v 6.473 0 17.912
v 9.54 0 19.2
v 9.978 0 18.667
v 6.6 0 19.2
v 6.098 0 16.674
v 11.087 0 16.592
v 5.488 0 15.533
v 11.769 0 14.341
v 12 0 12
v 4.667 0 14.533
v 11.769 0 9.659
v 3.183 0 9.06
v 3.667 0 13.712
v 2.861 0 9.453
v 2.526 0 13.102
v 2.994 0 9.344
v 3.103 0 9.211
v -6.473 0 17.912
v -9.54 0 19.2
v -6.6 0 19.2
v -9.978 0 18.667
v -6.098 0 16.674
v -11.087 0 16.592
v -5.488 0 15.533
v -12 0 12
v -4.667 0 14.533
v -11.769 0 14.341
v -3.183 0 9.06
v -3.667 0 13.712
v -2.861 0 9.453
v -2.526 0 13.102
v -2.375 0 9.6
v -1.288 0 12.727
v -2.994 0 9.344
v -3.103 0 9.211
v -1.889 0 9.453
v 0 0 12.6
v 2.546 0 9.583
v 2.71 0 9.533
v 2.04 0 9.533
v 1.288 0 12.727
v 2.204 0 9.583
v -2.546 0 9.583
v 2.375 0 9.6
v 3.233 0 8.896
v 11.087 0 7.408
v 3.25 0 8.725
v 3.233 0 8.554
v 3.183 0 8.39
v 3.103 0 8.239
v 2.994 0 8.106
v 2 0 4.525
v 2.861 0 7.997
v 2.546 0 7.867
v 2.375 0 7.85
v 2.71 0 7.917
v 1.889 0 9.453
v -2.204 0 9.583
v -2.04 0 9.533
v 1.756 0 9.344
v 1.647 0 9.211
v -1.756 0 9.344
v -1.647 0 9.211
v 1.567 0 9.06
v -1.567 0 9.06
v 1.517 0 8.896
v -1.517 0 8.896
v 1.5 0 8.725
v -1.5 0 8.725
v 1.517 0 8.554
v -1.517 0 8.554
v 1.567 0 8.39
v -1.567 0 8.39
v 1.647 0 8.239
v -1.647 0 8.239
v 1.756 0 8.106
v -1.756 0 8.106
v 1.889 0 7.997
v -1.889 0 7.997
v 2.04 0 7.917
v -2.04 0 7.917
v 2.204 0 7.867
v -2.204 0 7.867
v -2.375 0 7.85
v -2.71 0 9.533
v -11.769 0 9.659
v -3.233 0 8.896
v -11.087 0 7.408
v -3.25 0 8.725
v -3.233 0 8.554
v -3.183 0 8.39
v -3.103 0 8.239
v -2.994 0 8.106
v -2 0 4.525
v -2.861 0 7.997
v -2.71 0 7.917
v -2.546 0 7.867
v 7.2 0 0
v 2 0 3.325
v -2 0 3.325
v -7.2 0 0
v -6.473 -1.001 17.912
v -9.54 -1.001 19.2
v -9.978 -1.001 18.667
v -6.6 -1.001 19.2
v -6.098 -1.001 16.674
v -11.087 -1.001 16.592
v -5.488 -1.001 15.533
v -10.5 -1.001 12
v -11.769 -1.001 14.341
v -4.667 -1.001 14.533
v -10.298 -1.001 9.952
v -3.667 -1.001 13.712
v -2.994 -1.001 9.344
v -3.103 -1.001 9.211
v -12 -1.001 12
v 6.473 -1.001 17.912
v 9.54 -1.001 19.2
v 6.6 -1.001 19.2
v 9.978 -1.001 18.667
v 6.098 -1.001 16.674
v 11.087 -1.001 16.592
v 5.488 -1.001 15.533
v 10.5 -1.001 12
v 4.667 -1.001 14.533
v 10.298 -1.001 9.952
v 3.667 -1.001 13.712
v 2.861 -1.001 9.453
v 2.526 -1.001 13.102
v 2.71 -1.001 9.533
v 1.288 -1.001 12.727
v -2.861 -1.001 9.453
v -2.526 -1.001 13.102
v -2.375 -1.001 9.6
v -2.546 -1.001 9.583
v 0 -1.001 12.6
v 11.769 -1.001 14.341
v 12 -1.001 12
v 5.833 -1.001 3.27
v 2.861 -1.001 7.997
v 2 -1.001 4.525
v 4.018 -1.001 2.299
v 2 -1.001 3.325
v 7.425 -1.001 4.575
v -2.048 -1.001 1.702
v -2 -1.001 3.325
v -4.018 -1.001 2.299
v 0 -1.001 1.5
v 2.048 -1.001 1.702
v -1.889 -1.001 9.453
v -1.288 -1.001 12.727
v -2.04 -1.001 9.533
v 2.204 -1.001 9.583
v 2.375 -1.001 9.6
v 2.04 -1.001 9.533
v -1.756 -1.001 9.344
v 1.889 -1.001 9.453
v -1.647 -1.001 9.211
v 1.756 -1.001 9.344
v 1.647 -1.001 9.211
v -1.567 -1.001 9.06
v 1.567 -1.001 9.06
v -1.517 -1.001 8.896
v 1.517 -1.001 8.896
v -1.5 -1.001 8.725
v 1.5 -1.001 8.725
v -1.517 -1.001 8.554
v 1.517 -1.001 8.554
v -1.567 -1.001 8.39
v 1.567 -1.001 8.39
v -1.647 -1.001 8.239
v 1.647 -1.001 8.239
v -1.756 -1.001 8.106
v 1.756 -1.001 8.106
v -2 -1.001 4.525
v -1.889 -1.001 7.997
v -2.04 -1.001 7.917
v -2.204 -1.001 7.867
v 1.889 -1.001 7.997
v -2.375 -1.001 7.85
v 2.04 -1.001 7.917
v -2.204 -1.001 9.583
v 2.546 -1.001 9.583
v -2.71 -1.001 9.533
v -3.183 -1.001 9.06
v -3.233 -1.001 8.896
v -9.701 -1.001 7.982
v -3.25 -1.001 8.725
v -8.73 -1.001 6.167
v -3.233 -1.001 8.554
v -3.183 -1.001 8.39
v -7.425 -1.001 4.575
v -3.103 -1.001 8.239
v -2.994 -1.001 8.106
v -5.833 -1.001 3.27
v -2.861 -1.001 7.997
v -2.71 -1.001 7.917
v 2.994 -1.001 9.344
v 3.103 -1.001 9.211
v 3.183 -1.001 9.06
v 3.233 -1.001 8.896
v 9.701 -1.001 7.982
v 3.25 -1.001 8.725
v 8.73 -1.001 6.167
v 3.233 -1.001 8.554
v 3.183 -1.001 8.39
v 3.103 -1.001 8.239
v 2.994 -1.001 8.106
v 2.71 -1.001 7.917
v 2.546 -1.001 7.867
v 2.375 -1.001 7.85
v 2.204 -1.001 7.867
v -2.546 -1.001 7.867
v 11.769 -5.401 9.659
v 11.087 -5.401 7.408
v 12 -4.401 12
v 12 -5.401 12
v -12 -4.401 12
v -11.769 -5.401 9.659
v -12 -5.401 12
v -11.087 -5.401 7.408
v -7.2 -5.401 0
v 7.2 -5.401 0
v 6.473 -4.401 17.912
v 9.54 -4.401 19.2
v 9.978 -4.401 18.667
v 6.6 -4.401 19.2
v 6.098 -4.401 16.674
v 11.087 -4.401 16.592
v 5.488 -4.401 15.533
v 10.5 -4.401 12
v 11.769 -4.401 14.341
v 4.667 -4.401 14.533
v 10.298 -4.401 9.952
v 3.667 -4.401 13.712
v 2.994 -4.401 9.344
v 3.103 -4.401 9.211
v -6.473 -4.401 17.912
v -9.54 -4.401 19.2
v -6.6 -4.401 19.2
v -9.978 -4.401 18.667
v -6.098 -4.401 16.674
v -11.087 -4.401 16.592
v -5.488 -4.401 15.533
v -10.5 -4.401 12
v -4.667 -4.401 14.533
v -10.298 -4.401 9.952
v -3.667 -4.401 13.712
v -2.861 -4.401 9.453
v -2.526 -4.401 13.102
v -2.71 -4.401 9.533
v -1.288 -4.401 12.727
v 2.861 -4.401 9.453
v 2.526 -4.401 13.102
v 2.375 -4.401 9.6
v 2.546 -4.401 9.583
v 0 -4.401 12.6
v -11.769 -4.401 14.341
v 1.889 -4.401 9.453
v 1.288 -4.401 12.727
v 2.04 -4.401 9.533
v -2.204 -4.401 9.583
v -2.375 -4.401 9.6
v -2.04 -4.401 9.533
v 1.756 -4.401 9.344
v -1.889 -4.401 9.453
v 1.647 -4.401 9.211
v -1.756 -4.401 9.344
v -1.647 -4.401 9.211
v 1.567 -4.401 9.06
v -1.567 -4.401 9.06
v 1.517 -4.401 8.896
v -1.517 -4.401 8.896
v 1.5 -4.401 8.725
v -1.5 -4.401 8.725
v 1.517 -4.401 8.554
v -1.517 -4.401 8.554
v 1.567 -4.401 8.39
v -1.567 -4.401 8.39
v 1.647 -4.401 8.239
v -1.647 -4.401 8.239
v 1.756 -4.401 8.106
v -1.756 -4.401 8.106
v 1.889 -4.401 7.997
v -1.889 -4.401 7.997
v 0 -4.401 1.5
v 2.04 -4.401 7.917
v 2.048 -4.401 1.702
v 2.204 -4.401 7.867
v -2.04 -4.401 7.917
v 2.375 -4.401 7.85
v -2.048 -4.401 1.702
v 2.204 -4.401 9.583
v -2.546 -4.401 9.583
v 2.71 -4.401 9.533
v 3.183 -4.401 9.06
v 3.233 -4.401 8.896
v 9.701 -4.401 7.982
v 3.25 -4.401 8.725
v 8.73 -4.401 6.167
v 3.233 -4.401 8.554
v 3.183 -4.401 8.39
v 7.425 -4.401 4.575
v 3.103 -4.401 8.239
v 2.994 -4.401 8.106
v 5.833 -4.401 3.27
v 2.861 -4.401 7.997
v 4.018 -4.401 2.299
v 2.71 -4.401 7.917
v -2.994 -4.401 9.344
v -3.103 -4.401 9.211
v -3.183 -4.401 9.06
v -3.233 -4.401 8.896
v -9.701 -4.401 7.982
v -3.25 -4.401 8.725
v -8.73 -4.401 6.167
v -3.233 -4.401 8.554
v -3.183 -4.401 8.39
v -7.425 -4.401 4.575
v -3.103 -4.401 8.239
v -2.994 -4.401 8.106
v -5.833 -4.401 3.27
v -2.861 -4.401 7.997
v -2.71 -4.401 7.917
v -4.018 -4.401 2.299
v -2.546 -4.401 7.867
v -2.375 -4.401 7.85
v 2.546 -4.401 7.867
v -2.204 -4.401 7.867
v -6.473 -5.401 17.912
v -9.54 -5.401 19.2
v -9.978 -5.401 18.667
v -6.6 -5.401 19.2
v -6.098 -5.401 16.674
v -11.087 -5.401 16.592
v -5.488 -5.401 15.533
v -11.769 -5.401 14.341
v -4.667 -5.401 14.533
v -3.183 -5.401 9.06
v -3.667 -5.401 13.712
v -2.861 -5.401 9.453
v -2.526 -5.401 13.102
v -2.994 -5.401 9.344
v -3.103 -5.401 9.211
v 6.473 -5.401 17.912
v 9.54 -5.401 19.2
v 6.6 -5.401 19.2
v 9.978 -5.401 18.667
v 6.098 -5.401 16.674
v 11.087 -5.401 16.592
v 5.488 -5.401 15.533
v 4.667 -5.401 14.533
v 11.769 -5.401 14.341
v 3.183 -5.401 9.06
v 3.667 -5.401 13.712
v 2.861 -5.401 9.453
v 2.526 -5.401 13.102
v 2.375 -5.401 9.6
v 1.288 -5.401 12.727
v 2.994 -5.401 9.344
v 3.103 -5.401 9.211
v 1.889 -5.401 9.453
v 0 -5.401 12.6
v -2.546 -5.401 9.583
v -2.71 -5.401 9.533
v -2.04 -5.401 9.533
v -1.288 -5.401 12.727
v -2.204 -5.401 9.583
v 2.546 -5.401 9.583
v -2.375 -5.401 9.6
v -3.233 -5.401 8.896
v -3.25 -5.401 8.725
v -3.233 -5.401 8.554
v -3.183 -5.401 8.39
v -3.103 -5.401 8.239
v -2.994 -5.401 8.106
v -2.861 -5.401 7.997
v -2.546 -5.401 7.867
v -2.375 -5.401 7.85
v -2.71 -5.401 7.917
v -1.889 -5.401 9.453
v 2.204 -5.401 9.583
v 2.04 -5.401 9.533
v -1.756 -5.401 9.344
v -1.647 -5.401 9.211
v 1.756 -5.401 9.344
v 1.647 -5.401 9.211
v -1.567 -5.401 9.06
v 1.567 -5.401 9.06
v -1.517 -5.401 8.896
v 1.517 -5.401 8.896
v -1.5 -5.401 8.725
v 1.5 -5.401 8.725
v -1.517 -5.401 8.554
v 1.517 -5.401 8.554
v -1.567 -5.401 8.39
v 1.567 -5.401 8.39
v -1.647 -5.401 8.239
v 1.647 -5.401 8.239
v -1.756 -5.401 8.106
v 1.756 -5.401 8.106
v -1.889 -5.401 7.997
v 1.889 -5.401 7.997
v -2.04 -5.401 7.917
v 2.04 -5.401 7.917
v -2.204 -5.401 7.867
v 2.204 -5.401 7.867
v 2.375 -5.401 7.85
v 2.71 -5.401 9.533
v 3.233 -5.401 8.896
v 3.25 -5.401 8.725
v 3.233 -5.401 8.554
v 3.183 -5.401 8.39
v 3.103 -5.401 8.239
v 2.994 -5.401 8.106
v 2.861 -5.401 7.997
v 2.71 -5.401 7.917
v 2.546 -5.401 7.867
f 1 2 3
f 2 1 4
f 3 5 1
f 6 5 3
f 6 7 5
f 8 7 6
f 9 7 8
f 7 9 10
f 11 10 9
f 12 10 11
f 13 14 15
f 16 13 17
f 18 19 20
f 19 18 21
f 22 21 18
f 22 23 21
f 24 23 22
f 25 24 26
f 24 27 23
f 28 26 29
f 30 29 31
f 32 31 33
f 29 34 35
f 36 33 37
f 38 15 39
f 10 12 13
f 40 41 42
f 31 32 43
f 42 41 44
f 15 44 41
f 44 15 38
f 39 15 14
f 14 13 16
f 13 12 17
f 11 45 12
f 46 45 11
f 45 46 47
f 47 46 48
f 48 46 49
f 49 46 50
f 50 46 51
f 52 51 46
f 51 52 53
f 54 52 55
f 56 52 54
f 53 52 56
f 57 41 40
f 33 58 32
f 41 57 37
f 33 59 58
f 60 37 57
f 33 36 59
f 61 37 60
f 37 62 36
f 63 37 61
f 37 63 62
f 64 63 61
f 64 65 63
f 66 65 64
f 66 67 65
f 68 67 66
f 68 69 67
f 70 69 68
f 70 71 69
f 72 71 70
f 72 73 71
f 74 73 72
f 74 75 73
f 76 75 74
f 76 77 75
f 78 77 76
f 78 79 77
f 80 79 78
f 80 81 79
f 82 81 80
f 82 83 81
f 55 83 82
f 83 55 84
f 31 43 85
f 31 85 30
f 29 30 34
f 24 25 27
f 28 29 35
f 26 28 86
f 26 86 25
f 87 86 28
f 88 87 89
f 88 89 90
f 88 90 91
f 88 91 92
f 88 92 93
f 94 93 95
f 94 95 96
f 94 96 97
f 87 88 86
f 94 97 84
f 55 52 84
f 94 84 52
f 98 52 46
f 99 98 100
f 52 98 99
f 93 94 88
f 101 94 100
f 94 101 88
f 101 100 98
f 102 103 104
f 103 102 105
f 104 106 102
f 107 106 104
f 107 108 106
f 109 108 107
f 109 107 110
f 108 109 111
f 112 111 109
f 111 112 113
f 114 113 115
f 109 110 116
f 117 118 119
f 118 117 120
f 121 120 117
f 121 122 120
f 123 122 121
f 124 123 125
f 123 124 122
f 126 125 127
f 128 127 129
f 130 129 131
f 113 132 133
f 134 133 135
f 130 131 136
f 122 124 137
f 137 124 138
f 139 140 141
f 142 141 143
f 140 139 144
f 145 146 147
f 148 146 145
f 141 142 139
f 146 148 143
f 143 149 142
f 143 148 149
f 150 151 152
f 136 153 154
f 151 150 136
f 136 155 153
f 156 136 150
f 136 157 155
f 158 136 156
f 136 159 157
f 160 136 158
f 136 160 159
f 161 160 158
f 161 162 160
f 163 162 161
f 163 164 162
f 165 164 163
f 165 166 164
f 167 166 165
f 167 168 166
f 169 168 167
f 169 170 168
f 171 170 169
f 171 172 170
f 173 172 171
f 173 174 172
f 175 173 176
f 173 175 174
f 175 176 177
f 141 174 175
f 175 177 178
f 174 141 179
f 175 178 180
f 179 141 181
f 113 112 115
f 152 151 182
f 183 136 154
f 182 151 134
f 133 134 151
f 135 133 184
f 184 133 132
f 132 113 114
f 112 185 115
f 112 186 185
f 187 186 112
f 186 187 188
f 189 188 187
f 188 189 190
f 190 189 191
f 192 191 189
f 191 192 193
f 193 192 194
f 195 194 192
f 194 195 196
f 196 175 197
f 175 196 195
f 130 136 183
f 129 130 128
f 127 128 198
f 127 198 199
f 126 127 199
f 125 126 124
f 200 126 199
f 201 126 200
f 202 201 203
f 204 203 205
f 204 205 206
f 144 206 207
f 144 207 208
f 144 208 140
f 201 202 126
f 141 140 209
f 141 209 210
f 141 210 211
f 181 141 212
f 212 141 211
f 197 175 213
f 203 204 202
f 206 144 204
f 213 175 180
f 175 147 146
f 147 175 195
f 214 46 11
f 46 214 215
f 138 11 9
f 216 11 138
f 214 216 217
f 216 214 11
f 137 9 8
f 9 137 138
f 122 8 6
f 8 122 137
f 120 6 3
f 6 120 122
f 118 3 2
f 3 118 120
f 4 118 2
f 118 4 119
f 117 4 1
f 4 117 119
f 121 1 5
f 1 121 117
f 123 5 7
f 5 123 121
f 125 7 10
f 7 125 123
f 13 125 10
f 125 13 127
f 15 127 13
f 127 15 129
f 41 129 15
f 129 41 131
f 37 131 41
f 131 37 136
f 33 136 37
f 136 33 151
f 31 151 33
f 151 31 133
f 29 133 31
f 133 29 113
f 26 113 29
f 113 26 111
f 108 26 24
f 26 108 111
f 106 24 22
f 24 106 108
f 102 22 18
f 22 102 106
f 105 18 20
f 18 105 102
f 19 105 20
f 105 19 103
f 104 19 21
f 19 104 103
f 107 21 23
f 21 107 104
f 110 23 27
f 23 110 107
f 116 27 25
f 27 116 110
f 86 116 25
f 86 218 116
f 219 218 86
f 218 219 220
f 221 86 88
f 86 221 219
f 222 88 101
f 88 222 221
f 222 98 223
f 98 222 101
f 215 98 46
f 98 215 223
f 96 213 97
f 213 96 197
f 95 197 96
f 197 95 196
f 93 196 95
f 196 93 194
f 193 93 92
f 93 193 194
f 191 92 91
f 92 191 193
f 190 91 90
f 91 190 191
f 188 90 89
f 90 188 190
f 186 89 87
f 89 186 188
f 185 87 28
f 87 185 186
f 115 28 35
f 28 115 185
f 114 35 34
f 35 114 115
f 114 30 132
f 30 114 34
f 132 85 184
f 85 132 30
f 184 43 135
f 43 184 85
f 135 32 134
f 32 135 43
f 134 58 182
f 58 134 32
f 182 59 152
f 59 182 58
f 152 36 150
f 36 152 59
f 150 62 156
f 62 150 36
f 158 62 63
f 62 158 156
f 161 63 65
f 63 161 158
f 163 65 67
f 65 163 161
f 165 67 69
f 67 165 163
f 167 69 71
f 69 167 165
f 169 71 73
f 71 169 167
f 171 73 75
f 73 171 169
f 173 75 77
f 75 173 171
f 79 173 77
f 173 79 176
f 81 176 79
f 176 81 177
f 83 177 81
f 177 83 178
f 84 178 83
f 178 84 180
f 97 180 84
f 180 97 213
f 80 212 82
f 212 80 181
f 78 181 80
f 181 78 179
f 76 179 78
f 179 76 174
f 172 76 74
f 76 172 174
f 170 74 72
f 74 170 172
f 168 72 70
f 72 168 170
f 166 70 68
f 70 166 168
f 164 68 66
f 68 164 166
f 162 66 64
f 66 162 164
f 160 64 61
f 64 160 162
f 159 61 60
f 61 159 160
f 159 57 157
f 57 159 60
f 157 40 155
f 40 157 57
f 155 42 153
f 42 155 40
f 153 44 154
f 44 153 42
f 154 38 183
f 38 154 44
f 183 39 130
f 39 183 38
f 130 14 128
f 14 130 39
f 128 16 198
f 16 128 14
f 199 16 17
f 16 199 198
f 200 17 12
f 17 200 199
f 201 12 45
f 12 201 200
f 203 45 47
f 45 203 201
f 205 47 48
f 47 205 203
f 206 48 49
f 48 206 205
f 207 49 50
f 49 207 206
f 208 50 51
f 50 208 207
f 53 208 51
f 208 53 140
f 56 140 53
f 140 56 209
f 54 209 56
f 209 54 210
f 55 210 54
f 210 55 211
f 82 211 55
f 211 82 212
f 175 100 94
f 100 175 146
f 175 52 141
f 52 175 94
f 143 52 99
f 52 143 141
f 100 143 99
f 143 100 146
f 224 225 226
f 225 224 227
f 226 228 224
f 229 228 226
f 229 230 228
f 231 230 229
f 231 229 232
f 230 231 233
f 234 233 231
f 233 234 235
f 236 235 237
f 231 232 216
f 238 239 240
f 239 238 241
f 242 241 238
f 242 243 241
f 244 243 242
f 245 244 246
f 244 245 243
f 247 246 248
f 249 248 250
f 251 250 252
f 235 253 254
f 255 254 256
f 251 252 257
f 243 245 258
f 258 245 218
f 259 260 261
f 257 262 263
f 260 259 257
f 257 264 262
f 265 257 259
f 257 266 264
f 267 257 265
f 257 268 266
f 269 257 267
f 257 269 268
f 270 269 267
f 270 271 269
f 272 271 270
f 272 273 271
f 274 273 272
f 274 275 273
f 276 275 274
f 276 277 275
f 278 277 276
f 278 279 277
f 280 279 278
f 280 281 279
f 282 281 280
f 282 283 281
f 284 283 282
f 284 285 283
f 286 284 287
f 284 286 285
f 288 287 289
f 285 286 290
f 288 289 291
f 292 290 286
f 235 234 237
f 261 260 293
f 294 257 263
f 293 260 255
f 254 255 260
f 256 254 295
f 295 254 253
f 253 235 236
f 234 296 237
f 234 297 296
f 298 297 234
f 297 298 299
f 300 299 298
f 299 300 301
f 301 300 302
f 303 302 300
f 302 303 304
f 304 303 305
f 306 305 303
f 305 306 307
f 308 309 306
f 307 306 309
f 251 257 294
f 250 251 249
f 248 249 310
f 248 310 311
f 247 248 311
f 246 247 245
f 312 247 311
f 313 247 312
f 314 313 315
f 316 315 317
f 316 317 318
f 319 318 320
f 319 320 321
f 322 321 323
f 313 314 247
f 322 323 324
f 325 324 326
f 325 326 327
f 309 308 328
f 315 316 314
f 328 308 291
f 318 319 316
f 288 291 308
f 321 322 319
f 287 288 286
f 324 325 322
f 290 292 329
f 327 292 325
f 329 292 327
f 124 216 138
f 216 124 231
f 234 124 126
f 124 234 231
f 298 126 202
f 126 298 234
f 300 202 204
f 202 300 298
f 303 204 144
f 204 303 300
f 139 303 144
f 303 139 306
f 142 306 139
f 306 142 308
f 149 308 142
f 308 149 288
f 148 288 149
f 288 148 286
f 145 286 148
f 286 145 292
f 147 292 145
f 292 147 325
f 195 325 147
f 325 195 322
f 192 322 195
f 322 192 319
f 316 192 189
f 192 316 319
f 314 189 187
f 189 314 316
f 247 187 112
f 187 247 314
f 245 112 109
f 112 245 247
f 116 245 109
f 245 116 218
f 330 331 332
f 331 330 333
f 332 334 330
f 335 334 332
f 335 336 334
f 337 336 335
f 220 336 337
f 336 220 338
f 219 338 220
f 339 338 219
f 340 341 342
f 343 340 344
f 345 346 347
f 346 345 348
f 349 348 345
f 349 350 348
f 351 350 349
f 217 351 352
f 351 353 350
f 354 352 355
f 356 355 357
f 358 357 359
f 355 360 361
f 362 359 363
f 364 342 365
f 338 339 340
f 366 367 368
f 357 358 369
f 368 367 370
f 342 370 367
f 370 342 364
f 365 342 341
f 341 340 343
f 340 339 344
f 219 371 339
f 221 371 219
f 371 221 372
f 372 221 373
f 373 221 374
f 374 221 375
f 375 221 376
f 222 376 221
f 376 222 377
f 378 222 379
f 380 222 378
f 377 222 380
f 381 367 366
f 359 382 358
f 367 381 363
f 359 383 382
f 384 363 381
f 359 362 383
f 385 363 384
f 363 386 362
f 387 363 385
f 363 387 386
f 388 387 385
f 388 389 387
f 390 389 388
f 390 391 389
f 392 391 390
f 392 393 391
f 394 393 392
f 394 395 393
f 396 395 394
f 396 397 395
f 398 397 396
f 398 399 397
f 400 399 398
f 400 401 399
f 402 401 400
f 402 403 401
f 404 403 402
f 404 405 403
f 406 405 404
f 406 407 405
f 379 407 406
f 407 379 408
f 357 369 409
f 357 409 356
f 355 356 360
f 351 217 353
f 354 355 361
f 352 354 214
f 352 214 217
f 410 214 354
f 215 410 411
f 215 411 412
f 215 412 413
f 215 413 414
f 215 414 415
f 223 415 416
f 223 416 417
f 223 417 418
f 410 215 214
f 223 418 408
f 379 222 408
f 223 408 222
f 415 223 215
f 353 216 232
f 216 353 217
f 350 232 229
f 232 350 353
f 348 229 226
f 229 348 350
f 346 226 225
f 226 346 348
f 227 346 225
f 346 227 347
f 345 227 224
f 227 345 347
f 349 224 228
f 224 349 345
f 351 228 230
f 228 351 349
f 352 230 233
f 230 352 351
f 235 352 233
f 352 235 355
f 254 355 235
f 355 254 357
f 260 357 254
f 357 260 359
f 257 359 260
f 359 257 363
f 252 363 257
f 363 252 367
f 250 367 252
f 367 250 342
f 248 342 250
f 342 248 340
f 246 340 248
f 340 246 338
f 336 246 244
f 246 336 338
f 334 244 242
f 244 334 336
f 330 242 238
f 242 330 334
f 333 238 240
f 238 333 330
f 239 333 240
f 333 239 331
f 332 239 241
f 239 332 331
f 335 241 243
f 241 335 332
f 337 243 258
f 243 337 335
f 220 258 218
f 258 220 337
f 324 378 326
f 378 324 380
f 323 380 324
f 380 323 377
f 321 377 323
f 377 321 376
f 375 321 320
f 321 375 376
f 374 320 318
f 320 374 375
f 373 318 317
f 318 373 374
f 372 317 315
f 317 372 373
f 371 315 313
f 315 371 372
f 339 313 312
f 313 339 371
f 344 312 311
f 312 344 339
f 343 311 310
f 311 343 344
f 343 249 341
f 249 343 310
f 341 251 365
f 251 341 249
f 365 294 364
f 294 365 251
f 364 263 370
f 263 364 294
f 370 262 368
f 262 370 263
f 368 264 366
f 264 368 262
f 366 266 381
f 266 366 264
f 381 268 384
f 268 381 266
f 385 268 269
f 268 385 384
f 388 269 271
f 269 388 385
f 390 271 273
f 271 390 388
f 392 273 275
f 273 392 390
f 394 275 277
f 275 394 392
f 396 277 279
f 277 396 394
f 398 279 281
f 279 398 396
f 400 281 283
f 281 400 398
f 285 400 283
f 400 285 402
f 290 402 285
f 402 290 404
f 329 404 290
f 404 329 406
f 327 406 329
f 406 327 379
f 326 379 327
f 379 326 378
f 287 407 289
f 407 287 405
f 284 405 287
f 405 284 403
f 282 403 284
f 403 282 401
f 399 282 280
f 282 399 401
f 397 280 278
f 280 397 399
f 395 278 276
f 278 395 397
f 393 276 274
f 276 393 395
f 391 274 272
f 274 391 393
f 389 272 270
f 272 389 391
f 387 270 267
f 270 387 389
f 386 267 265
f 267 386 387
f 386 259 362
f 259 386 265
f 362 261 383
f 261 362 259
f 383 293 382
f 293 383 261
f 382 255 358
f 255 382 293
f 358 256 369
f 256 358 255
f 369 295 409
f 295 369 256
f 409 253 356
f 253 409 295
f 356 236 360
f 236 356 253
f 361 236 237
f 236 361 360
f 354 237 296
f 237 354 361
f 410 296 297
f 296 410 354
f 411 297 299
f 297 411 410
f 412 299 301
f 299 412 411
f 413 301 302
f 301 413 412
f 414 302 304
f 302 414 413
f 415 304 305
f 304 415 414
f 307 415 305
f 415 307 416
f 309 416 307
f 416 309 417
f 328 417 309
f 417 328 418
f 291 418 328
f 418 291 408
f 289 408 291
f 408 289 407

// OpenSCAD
cellThickness = 3.2;
cellDiameter = 20;
radialTolerance = 0.5;
sideTolerance = 0.1;
wireHoleDiameter = 1.75;
wireHoleSpacing = 3;
edgeWall = 1.5;
frontAndBackWall = 1;
heightFraction = 0.8;
baseFraction = 0.6;
graspDiameterFraction = 0.55;
wireVerticalOffset = 3;
labelSize = 4;

module dummy() {}

outerDiameter = cellDiameter+2*radialTolerance+2*edgeWall;

$fn = 32;
nudge = 0.001;

cy = outerDiameter/2;

module minus(size) {
    if (0<size)
        square([size,size*.3],center=true);
}

module outline(minusLabel=false) {
    bottom = baseFraction * outerDiameter;
    wy = outerDiameter*heightFraction - graspDiameterFraction*outerDiameter/2-wireVerticalOffset-wireHoleDiameter/2;
    wspace = wireHoleSpacing + wireHoleDiameter;
    difference() {
        intersection() {
            hull() {
                translate([0,cy]) circle(d=outerDiameter);
                translate([-bottom/2,0]) square([bottom,nudge]);
            }
            translate([-outerDiameter/2,0]) square([outerDiameter,outerDiameter*heightFraction]);
        }
        translate([0,outerDiameter*heightFraction]) circle(d=graspDiameterFraction*outerDiameter);
        for (s=[-1,1]) translate([s*wspace/2,wy]) circle(d=wireHoleDiameter);
        translate([0,(wy-wireHoleDiameter/2)/2]) 
        if (minusLabel)
            minus(labelSize);
    }
}

module holderEdge() {
    intersection() {
        difference() {
            hull() outline();
            translate([0,cy]) circle(d=cellDiameter+2*radialTolerance);
        }
        translate([-outerDiameter/2,0]) square([outerDiameter,outerDiameter/2]);
    }
}

module holder() {
    linear_extrude(height=frontAndBackWall+nudge) outline(minusLabel=true);
    translate([0,0,frontAndBackWall]) linear_extrude(height=cellThickness+2*sideTolerance+nudge) holderEdge();
    translate([0,0,frontAndBackWall+cellThickness+2*sideTolerance+nudge]) linear_extrude(height=frontAndBackWall) outline();
}

rotate([90,0,0]) holder();
